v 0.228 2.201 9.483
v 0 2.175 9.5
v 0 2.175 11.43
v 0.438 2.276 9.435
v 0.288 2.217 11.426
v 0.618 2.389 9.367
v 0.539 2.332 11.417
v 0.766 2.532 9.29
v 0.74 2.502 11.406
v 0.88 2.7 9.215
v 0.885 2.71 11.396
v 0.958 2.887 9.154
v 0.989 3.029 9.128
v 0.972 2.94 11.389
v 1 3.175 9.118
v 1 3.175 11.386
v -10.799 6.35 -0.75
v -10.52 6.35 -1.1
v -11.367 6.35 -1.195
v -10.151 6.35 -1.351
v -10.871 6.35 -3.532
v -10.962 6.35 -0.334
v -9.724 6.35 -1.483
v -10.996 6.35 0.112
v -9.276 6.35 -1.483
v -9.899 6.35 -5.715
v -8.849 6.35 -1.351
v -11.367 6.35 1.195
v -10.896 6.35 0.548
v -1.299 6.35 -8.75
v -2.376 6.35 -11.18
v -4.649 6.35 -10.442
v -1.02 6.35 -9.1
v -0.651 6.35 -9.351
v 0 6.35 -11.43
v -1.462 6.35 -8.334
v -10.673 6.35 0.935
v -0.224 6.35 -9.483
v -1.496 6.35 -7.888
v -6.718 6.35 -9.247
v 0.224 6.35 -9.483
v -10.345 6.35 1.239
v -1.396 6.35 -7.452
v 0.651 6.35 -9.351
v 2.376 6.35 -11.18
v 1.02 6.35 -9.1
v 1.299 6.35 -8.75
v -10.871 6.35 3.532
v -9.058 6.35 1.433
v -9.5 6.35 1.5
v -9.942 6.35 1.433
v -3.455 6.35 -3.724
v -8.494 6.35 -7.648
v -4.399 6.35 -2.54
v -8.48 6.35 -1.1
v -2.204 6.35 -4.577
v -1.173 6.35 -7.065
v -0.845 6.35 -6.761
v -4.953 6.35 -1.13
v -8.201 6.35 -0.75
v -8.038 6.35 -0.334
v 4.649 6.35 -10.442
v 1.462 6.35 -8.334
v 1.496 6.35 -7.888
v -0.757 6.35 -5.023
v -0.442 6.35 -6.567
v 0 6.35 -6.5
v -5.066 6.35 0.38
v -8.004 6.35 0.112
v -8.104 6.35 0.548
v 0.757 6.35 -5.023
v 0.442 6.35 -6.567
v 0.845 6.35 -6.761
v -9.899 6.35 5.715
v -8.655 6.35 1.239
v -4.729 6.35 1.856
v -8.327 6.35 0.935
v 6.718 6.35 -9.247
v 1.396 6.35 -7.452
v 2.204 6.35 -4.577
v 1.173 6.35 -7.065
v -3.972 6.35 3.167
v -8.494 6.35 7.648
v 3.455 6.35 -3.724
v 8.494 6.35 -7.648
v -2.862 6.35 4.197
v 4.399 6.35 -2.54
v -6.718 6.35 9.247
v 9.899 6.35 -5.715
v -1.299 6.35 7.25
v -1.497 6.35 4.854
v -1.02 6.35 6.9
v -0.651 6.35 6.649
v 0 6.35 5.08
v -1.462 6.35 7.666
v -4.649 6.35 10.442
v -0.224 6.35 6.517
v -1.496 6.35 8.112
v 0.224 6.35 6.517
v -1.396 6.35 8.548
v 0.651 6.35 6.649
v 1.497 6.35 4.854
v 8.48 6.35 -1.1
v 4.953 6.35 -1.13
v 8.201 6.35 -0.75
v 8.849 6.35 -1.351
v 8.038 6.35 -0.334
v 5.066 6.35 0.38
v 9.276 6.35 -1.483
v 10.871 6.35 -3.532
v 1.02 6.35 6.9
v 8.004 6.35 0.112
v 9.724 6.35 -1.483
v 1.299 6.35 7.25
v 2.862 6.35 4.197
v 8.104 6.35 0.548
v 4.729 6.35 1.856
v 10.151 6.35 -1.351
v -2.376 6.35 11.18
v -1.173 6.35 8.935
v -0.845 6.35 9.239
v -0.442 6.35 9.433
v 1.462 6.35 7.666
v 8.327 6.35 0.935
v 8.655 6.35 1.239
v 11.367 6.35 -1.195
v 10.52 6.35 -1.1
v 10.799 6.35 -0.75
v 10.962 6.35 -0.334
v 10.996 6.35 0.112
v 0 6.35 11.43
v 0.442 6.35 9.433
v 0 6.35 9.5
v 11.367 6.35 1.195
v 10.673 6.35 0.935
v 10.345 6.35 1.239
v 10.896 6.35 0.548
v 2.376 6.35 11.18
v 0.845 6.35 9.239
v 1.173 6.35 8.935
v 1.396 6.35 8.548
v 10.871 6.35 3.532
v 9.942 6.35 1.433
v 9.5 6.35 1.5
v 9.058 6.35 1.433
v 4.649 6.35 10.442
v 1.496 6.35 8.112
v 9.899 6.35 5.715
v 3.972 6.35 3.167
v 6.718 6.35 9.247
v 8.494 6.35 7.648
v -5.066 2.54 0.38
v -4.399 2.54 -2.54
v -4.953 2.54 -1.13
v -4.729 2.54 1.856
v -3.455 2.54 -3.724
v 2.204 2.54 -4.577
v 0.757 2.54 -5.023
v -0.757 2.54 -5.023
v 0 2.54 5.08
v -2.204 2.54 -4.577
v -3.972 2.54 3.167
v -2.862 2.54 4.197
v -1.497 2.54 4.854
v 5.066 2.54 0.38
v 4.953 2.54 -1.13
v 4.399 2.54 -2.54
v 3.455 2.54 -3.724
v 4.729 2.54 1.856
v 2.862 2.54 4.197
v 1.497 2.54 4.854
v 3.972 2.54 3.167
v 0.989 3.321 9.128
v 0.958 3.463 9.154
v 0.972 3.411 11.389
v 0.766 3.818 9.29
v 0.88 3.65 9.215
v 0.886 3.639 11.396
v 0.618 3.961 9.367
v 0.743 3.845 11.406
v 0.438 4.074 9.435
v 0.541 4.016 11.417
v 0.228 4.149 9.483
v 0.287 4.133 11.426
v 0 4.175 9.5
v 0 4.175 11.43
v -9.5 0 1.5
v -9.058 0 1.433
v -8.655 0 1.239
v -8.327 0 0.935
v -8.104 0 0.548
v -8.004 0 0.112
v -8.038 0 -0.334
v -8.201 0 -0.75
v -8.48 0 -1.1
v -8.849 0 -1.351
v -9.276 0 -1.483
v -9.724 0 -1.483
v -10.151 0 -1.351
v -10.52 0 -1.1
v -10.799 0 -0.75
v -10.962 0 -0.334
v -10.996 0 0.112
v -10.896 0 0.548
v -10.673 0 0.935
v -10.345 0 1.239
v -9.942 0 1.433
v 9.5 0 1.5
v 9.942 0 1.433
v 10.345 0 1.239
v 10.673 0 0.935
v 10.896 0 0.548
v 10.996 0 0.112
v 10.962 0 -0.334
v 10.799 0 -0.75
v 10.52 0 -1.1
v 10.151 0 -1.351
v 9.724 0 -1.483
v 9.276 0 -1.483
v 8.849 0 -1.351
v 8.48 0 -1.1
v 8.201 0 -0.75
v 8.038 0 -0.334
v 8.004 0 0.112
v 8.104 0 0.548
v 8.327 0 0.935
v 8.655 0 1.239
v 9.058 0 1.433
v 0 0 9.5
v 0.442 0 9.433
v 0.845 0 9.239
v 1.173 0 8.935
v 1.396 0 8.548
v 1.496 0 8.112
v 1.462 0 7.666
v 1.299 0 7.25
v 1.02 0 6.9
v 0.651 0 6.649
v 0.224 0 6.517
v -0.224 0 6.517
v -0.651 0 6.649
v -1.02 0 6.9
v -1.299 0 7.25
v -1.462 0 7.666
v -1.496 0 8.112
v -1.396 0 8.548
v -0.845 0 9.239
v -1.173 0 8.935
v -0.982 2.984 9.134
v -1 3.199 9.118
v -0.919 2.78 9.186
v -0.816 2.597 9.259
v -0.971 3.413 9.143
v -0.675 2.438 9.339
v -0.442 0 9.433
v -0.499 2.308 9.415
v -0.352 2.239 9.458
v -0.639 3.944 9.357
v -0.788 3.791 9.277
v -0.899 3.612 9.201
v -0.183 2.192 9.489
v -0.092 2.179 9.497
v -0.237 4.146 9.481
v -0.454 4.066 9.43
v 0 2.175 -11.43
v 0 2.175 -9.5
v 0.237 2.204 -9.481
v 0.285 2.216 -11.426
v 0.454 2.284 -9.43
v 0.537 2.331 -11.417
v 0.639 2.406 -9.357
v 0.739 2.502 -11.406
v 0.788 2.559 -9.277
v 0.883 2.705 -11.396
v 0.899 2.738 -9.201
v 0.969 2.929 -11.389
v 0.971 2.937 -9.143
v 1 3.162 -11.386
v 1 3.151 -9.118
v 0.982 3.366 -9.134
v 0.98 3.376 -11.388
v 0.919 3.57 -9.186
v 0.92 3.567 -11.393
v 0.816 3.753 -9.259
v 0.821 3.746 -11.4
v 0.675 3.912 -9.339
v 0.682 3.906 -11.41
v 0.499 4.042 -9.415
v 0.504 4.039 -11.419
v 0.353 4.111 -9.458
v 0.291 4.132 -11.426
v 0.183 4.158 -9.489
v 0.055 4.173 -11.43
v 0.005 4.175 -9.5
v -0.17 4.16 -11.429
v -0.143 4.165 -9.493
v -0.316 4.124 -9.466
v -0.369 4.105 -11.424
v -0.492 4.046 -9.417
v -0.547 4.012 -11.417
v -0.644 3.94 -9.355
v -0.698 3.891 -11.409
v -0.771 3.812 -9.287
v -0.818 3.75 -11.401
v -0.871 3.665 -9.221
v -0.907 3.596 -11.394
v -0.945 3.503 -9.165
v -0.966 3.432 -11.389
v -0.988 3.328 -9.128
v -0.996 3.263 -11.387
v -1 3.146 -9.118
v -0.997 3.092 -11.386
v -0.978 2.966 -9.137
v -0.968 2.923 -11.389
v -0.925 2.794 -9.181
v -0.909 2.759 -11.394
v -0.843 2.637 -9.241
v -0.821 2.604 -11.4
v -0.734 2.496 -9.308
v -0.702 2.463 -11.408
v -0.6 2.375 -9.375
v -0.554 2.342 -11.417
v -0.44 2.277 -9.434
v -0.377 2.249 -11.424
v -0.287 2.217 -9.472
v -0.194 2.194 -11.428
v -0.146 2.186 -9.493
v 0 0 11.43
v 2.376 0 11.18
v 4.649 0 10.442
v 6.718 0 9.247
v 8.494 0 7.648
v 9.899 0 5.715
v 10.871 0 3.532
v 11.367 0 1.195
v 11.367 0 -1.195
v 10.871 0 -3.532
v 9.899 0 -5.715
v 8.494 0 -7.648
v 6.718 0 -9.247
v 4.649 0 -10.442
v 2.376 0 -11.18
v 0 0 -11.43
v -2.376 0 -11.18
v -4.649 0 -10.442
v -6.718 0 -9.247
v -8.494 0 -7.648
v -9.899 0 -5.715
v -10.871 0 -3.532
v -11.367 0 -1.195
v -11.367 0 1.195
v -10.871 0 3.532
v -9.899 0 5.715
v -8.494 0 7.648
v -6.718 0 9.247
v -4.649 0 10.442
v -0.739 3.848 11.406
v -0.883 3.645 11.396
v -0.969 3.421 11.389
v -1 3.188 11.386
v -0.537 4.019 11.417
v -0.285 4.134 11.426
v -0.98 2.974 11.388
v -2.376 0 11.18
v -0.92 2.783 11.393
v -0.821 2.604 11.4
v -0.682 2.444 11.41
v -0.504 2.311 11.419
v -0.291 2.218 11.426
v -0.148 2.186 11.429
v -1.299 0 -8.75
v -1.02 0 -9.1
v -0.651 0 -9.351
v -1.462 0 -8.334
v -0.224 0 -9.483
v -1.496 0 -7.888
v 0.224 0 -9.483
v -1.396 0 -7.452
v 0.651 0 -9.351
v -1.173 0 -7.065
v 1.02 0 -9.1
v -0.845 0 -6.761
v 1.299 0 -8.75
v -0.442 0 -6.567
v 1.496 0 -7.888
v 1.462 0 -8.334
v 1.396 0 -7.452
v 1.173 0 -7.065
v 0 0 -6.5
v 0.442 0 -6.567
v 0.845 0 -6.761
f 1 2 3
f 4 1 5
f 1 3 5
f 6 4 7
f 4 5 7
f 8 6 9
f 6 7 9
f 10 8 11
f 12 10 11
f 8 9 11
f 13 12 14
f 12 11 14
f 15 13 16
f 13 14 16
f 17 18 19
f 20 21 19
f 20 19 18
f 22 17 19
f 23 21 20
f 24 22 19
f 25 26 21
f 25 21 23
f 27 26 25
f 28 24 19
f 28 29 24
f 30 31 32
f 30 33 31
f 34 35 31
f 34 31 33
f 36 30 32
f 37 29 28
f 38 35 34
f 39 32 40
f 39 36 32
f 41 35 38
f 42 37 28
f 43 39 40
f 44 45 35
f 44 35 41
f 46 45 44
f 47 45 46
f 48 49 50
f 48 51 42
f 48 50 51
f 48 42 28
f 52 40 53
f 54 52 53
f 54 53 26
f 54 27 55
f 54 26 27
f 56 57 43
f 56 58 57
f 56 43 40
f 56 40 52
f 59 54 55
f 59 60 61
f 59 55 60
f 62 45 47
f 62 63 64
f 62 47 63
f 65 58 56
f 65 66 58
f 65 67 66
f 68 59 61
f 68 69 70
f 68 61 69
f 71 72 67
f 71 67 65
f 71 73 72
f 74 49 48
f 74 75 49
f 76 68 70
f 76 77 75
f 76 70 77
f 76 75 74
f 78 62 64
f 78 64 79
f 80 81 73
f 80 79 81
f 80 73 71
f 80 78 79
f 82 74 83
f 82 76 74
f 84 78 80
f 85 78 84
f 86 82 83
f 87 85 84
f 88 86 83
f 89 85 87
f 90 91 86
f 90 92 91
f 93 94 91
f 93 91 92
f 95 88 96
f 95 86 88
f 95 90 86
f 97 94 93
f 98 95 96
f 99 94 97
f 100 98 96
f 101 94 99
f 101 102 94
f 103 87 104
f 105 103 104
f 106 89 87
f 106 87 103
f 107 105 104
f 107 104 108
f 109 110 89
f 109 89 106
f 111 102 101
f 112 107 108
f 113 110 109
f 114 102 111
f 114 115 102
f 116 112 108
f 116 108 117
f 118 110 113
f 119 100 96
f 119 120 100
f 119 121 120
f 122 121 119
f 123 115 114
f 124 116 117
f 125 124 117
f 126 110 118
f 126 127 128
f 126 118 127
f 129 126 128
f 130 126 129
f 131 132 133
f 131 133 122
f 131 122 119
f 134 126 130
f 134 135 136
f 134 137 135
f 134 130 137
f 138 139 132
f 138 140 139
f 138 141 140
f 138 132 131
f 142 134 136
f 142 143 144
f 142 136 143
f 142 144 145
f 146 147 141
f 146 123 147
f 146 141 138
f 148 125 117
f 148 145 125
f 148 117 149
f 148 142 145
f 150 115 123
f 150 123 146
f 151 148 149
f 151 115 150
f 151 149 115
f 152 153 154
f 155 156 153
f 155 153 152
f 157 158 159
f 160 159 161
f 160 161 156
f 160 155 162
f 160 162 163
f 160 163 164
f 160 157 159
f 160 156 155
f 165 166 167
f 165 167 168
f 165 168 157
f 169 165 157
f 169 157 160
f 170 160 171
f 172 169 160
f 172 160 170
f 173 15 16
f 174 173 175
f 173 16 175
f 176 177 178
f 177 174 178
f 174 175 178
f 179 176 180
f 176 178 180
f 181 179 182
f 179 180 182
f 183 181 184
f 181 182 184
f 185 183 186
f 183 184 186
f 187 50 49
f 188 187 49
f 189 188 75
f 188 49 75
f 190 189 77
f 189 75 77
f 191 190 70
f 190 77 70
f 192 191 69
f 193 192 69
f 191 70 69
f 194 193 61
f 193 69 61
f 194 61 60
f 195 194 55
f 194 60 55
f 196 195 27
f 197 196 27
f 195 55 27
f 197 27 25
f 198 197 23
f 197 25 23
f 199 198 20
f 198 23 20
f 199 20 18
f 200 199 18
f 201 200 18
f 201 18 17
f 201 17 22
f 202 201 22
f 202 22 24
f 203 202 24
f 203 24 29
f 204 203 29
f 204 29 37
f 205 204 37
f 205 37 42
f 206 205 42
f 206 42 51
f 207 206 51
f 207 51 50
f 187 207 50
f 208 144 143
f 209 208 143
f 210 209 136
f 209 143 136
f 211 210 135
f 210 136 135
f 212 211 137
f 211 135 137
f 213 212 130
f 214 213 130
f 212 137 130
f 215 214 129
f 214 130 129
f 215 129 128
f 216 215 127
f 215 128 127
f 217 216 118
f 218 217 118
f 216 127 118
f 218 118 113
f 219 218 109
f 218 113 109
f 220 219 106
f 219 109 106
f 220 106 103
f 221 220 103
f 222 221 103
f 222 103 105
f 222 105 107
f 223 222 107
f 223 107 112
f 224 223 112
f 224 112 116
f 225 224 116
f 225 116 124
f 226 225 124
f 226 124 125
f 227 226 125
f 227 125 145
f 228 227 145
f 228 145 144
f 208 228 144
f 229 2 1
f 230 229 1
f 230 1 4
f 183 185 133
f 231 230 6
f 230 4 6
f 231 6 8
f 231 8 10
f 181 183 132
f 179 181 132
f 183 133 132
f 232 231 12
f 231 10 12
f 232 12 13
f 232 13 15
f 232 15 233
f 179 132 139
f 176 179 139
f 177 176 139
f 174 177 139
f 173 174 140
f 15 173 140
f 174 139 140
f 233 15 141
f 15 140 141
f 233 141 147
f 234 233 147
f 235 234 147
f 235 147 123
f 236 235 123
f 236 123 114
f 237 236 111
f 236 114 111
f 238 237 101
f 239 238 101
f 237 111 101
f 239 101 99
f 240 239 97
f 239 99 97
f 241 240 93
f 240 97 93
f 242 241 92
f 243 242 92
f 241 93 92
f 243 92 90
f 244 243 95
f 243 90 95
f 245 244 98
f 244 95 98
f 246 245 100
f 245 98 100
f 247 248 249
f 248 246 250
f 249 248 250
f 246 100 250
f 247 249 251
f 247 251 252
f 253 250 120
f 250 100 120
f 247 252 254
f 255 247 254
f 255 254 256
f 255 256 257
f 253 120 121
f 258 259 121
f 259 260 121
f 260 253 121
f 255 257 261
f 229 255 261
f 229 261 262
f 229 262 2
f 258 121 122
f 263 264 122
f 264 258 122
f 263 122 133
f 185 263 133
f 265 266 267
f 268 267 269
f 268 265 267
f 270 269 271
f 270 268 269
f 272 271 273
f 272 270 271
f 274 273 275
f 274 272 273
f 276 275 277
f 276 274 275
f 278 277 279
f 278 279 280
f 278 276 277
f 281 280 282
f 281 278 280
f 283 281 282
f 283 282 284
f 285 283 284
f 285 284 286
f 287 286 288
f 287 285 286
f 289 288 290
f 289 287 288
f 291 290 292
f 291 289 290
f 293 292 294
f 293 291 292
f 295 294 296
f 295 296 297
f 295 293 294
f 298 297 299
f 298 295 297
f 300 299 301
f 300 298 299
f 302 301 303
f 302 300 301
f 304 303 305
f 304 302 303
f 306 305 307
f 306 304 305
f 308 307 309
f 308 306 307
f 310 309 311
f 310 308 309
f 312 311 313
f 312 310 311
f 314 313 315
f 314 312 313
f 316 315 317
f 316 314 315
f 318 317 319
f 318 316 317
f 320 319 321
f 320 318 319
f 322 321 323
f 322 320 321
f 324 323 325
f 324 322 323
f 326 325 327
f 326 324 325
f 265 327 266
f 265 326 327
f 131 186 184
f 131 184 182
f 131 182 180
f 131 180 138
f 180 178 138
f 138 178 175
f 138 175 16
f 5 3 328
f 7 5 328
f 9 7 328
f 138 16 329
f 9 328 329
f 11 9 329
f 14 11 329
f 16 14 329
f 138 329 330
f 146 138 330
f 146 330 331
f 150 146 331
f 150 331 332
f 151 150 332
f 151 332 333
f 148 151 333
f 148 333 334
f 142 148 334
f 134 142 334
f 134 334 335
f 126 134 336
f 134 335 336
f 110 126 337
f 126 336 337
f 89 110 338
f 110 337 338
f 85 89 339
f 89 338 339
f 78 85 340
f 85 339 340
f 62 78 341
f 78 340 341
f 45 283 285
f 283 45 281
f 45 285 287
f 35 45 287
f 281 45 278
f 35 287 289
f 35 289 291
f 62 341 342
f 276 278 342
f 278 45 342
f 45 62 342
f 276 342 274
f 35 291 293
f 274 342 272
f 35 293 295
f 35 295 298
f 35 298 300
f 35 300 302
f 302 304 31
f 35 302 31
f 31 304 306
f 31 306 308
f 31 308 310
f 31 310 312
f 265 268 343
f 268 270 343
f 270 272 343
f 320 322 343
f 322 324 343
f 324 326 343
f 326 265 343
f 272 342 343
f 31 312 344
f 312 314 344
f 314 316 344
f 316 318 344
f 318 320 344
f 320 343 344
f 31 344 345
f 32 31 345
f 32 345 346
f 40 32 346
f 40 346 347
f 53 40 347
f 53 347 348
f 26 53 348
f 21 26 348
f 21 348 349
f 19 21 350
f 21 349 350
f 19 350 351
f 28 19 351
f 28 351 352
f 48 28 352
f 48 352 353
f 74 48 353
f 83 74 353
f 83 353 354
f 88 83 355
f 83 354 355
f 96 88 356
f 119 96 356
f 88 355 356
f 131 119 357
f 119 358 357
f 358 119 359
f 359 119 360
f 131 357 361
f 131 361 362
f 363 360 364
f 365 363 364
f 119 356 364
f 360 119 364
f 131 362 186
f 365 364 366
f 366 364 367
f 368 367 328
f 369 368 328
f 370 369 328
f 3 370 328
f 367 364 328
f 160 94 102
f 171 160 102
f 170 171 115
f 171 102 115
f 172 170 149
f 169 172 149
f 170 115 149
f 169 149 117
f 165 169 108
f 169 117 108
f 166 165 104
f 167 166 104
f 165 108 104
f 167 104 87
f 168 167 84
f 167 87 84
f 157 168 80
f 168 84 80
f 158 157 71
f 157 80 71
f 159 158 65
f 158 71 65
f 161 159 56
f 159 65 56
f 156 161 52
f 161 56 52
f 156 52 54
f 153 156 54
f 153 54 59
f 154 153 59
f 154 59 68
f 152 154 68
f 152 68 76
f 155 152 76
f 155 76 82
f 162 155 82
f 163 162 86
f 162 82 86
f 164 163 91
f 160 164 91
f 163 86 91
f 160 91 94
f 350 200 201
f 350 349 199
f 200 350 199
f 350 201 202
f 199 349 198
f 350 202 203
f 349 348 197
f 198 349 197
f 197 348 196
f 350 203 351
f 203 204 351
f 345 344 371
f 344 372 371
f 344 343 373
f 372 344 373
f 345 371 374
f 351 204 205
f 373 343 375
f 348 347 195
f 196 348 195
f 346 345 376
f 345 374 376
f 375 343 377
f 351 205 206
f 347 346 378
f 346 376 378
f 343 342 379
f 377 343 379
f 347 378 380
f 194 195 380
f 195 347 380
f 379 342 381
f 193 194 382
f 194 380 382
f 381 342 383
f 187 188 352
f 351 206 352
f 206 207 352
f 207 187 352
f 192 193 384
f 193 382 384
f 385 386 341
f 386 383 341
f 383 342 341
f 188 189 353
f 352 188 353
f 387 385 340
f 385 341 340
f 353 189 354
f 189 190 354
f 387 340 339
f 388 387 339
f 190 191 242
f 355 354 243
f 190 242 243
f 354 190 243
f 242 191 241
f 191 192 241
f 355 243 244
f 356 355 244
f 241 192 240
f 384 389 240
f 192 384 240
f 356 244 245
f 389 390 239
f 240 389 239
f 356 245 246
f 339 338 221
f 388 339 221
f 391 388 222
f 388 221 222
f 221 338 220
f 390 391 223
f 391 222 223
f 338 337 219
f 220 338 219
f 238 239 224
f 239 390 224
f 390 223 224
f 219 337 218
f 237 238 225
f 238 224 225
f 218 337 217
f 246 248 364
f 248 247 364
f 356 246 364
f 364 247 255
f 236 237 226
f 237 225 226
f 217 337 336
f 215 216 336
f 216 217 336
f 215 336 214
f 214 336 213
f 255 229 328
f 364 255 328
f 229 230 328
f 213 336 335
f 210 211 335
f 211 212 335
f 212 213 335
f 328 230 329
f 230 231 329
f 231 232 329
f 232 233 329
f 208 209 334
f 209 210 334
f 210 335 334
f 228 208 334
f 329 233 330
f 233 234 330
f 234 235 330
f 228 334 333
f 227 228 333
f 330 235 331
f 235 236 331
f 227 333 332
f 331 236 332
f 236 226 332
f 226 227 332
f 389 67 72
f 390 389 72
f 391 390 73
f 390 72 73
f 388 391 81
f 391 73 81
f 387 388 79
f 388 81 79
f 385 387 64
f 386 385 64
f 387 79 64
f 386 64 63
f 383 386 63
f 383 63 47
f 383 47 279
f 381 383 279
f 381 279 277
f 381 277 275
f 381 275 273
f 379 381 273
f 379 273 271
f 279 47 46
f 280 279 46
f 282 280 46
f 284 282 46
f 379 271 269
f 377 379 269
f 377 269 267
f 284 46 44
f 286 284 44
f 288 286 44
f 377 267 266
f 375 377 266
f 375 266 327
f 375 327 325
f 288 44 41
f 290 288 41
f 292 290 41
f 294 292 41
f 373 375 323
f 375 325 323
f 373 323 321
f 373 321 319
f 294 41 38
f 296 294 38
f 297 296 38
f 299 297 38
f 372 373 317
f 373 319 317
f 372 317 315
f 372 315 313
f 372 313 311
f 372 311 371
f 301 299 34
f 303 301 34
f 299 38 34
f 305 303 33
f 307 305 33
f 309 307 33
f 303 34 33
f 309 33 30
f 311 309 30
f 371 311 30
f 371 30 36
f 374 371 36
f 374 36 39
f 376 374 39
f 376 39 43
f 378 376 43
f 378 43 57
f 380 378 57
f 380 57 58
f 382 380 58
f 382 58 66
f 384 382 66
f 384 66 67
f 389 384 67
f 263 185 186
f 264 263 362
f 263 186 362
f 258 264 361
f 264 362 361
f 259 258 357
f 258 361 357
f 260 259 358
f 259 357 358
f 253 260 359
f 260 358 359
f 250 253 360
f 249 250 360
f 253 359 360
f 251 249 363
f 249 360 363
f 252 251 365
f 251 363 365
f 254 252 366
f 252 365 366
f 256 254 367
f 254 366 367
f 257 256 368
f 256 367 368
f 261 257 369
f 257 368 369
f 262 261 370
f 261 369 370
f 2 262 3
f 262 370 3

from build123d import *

# Parameters (mm, degrees)
SKETCH2_R               = 11.43
BOSS_EXTRUDE1_DEPTH     = 6.35
SKETCH4_R               = 1.5
CUT_EXTRUDE1_DEPTH      = 18.366988801
CUT_EXTRUDE2_REACH      = 29.445
CUT_EXTRUDE2_END_RADIUS = 1.5
CUT_EXTRUDE3_REACH      = 29.445
CUT_EXTRUDE3_END_RADIUS = 1.5
SKETCH9_R               = 1
SKETCH10_R              = 5.08
CUT_EXTRUDE4_DEPTH      = 3.81


with BuildPart() as part:
    # Sketch2 → Boss-Extrude1 (new body)
    with BuildSketch(Plane(origin=(0, 0, 0), x_dir=(1, 0, 0), z_dir=(0, 1, 0))):
        with Locations(Location((0, 0, 0), (0, 0, 270))):
            Circle(SKETCH2_R)
    extrude(amount=BOSS_EXTRUDE1_DEPTH)

    # Sketch4 → Cut-Extrude1 (cut, through all)
    with BuildSketch(Plane(origin=(0, 6.35, 0), x_dir=(1, 0, 0), z_dir=(0, 1, 0))):
        with Locations(Location((0, 8, 0), (0, 0, 270))):
            Circle(SKETCH4_R)
        with Locations(Location((0, -8, 0), (0, 0, 270))):
            Circle(SKETCH4_R)
        with Locations(Location((9.5, 0, 0), (0, 0, 270))):
            Circle(SKETCH4_R)
        with Locations(Location((-9.5, 0, 0), (0, 0, 270))):
            Circle(SKETCH4_R)
    extrude(amount=-CUT_EXTRUDE1_DEPTH, mode=Mode.SUBTRACT)

    # Cut-Extrude2: up to this cylinder (the profile starts outside it)
    cut_extrude2_end = Plane(origin=(0, 3.175, 8), z_dir=(0, 1, 0)) * Cylinder(CUT_EXTRUDE2_END_RADIUS, 62.89, mode=Mode.PRIVATE)
    # Sketch8 → Cut-Extrude2 (cut, up to the surface)
    with BuildSketch(Plane.XY.offset(12.7), mode=Mode.PRIVATE) as cut_extrude2_sk1:
        with BuildLine():
            ThreePointArc((1, 3.175), (0.707106781, 3.882106781), (0, 4.175))
            Line((0, 4.175), (0, 2.175))
            ThreePointArc((0, 2.175), (0.707106781, 2.467893219), (1, 3.175))
        make_face()
    cut_extrude2_tool1 = extrude(cut_extrude2_sk1.sketch, amount=-CUT_EXTRUDE2_REACH, mode=Mode.PRIVATE) - cut_extrude2_end
    add(cut_extrude2_tool1.solids().sort_by_distance((0.424413, 3.175, 12.7))[0], mode=Mode.SUBTRACT)
    # Sketch8 → Cut-Extrude2 (cut, up to the surface)
    with BuildSketch(Plane.XY.offset(12.7), mode=Mode.PRIVATE) as cut_extrude2_sk2:
        with BuildLine():
            Line((0, 2.175), (0, 4.175))
            ThreePointArc((0, 4.175), (-1, 3.175), (0, 2.175))
        make_face()
    cut_extrude2_tool2 = extrude(cut_extrude2_sk2.sketch, amount=-CUT_EXTRUDE2_REACH, mode=Mode.PRIVATE) - cut_extrude2_end
    add(cut_extrude2_tool2.solids().sort_by_distance((-0.424413, 3.175, 12.7))[0], mode=Mode.SUBTRACT)
    # Sketch8 → Cut-Extrude2 (cut, up to the surface)
    with BuildSketch(Plane.XY.offset(12.7), mode=Mode.PRIVATE) as cut_extrude2_sk3:
        with BuildLine():
            ThreePointArc((1, 3.175), (0.707106781, 3.882106781), (0, 4.175))
            Line((0, 4.175), (0, 2.175))
            ThreePointArc((0, 2.175), (0.707106781, 2.467893219), (1, 3.175))
        make_face()
    cut_extrude2_tool3 = extrude(cut_extrude2_sk3.sketch, amount=-CUT_EXTRUDE2_REACH, mode=Mode.PRIVATE) - cut_extrude2_end
    add(cut_extrude2_tool3.solids().sort_by_distance((0.424413, 3.175, 12.7))[0], mode=Mode.SUBTRACT)
    # Sketch8 → Cut-Extrude2 (cut, up to the surface)
    with BuildSketch(Plane.XY.offset(12.7), mode=Mode.PRIVATE) as cut_extrude2_sk4:
        with BuildLine():
            Line((0, 2.175), (0, 4.175))
            ThreePointArc((0, 4.175), (-1, 3.175), (0, 2.175))
        make_face()
    cut_extrude2_tool4 = extrude(cut_extrude2_sk4.sketch, amount=-CUT_EXTRUDE2_REACH, mode=Mode.PRIVATE) - cut_extrude2_end
    add(cut_extrude2_tool4.solids().sort_by_distance((-0.424413, 3.175, 12.7))[0], mode=Mode.SUBTRACT)

    # Cut-Extrude3: up to this cylinder (the profile starts outside it)
    cut_extrude3_end = Plane(origin=(0, 3.175, -8), z_dir=(0, 1, 0)) * Cylinder(CUT_EXTRUDE3_END_RADIUS, 62.89, mode=Mode.PRIVATE)
    # Sketch9 → Cut-Extrude3 (cut, up to the surface)
    with BuildSketch(Plane.XY.offset(-12.7), mode=Mode.PRIVATE) as cut_extrude3_sk1:
        with Locations(Location((0, 3.175, 0), (0, 0, 270))):
            Circle(SKETCH9_R)
    cut_extrude3_tool1 = extrude(cut_extrude3_sk1.sketch, amount=CUT_EXTRUDE3_REACH, mode=Mode.PRIVATE) - cut_extrude3_end
    add(cut_extrude3_tool1.solids().sort_by_distance((0, 3.175, -12.7))[0], mode=Mode.SUBTRACT)

    # Sketch10 → Cut-Extrude4 (cut)
    with BuildSketch(Plane(origin=(0, 6.35, 0), x_dir=(1, 0, 0), z_dir=(0, 1, 0))):
        with Locations(Location((0, 0, 0), (0, 0, 270))):
            Circle(SKETCH10_R)
    extrude(amount=-CUT_EXTRUDE4_DEPTH, mode=Mode.SUBTRACT)


solid = part.part
